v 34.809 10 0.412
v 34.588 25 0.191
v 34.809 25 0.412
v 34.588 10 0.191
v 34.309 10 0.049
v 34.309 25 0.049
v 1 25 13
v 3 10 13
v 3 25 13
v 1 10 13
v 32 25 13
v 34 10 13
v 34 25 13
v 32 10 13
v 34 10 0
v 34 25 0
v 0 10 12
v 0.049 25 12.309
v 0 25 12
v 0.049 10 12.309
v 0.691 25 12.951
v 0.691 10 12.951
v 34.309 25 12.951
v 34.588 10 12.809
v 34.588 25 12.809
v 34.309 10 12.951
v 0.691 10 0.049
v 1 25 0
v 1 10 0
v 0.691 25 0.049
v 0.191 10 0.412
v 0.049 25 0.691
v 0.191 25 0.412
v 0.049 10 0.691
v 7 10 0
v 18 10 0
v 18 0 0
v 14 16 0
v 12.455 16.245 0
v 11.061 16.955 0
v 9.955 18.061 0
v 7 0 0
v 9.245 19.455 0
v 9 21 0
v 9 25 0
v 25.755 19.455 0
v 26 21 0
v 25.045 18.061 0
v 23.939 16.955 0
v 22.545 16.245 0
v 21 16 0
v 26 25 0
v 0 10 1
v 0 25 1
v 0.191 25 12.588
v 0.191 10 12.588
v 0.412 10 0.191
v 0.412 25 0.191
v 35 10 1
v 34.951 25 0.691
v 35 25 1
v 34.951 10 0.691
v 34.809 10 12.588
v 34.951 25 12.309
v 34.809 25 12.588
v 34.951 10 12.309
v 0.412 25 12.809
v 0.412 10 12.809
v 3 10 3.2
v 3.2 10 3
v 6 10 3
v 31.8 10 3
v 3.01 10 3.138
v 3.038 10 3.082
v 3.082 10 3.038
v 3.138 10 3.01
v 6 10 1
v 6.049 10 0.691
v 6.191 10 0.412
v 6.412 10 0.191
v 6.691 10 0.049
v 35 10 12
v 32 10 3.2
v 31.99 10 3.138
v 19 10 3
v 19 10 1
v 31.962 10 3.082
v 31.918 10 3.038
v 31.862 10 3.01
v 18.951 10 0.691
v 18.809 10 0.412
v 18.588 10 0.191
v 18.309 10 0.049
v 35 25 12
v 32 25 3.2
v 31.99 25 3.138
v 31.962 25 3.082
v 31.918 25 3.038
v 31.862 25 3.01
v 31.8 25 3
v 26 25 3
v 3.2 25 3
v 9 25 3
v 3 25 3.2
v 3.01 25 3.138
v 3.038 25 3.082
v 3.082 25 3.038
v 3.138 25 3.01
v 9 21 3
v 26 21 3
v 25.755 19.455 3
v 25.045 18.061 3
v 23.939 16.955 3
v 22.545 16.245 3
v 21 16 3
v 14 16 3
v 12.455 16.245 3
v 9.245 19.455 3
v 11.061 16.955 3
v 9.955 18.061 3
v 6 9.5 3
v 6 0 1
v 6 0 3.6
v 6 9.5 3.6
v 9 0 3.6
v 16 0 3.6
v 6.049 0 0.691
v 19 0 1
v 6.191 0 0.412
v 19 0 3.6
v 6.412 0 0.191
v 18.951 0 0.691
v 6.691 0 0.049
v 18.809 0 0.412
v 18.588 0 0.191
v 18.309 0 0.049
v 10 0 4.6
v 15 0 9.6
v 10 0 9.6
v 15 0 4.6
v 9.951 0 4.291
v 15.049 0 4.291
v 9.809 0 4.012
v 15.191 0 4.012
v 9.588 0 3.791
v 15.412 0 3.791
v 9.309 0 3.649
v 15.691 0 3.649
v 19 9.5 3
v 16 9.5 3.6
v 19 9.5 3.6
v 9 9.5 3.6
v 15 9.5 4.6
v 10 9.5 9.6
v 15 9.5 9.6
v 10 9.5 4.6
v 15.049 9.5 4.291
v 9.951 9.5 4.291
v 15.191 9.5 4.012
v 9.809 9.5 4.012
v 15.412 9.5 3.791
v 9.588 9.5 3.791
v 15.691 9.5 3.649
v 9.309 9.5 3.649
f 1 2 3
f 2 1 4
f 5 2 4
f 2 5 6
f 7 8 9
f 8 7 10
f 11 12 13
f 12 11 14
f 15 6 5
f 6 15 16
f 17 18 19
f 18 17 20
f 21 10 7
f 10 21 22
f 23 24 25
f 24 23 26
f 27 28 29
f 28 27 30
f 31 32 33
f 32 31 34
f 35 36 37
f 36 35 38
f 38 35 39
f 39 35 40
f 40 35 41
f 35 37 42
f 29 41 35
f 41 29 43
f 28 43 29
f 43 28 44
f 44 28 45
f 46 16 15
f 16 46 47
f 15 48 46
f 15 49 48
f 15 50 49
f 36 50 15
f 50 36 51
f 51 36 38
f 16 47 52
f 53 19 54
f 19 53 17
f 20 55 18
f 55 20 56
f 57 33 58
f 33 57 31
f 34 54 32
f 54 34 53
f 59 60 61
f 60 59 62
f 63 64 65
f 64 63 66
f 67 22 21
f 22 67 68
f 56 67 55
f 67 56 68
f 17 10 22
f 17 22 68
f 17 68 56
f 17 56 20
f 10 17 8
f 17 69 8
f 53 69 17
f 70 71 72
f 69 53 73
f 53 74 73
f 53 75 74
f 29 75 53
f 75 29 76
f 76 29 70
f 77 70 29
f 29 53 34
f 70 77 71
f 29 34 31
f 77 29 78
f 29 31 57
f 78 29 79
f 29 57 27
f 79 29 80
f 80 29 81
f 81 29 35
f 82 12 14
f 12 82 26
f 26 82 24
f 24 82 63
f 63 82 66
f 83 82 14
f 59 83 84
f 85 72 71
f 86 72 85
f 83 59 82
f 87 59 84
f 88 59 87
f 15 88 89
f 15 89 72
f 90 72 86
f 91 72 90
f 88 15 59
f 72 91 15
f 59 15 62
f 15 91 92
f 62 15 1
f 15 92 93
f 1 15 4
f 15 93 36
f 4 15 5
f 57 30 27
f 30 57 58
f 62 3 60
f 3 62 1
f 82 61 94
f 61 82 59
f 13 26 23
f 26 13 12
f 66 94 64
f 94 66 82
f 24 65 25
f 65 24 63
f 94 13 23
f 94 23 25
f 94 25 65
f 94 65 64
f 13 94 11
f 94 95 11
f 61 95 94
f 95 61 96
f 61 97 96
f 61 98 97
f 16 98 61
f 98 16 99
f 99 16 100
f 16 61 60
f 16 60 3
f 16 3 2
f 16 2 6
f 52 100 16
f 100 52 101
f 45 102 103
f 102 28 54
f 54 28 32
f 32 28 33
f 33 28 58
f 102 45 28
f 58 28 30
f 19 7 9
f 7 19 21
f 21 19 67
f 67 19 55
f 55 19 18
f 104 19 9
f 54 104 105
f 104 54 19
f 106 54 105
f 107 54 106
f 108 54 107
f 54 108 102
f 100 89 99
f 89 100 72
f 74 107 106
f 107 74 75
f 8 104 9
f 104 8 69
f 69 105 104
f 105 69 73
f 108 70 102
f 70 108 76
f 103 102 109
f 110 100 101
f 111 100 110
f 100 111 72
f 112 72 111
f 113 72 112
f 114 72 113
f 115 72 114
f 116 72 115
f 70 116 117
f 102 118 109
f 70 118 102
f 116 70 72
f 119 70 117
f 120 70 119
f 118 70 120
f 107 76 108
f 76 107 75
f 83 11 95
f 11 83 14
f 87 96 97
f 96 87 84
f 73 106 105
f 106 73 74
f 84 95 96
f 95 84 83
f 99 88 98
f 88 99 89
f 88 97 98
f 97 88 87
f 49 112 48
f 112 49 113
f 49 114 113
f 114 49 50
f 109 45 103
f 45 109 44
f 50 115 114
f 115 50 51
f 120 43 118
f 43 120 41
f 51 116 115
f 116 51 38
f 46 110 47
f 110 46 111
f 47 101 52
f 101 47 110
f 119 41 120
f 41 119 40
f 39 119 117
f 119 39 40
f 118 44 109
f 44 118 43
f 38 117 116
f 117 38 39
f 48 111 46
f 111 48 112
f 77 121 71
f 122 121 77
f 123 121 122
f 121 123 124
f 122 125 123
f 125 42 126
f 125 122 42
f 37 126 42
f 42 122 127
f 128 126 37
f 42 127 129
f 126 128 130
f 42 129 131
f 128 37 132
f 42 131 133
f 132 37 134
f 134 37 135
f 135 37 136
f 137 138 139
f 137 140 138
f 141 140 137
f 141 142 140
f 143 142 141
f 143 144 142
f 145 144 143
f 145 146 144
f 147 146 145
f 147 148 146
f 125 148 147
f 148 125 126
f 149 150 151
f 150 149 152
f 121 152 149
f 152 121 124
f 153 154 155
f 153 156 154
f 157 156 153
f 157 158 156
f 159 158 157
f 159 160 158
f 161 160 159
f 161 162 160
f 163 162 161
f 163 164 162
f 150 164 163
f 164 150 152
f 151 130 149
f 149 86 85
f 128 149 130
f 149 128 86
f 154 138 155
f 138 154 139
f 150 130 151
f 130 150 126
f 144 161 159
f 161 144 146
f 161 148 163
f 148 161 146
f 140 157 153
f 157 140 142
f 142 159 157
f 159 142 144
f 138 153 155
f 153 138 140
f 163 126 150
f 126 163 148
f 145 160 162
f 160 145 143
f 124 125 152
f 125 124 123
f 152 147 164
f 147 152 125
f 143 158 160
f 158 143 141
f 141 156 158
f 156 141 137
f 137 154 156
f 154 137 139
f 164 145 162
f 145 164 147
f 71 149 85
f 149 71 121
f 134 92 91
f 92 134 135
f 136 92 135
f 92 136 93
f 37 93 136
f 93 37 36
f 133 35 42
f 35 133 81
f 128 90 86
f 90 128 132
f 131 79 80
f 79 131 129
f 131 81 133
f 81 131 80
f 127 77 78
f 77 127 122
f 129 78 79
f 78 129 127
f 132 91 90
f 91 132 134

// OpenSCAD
// file: ../common/extrusions.scad
//
// Common extrusions
// Author: Joseph M. Joy FTC 12598 mentor
//
EPSILON = 0.001; // For moving things to properly punch out holes

// Makes a flat (horizontal) "T":
//
// --------------
// |wtXht     --|
// ----\     /---
//      |wbX|
//      |hb |
//      -----
//<xoff>
//
// It could also be an inverted L shape
// if the lower (vertical) bar is wide enough to extend beyond the right 
// hand side of the upper (horizontal) bar.
//
// {xoff} is horizontal distance to the start of the bar.
// {r} is the radius of the
// curve shown as diagonals above.
// t is the thickness of the plate - in
// the z direction.
// Origin is the left hand corner
// of the bounding rectangle.
// 
module T_channel(wb, hb, wt, ht, xoff, r, t) {
    ow = 2*wt; // wide enough to 
    oh = 2*(hb+ht); // high enough to descend below the shape

    difference() {
        cube([wt, hb+ht, t]);
        translate([xoff-ow,hb-oh,-EPSILON]) oblong(ow, oh, r, t+2*EPSILON);
        translate([xoff+wb,hb-oh,-EPSILON]) oblong(ow, oh, r, t+2*EPSILON);
    }
}


// Makes a flat (horizontal) "O":
//
// /-------------\
// |             |
// | /--------\  |
// | |         | |
// | |         | |
// | |         | |
// | \         / |
// |  ---------  |
// \------------/
//
//
// It could also be a U or L
// if the oblong hole extends outside the outer
// boundary.
//
// ({xoff},{yoff} is origin of bounding-rectangle of the oblong hole
// {(wo}, {ho}) is the bounding box of the outer oblong.
// {(wi}, {hi}) is the bounding box of the inner (hole) oblong.
// {r} is the radius of the
// curve shown as diagonals above.
// t is the thickness of the plate - in
// the z direction.
// Origin is the left hand corner
// of the bounding rectangle.
// 
module O_channel(wo, ho, wi, hi, xoff, yoff, ro, ri, t) {
    difference() {
        oblong(wo, ho, ro, t);
        translate([xoff, yoff, -EPSILON]) oblong(wi, hi, ri, t+2*EPSILON);
    }
}


// A rectangular prism that fits within {w} x {h} and
// has rounded corners with radius {r} on all 4 sides.
// The actual radius may be reduced so keep the oblong
// viable. {t} is the thickness (in z).
module oblong(w, h, r, t) {
    r = min(r, w/2-EPSILON, h/2-EPSILON);
    translate([r, r, 0])
    linear_extrude(height = t, center = false, convexity = 10) {
        offset(r = r) square([w-2*r, h-2*r]);
    }
}


//
// Example code
//
wb = 10;
hb = 20;
wt = 40;
ht = 30;
t = 5;
r = 5;
ri = 1;
xoff = 10;
oblong(wb, hb, r, t);
translate([wb+5, 0, 0]) T_channel(wb, hb, wt, ht, xoff, r, t);
translate([wb+wt+10, 0, 0]) O_channel(wt, hb+ht, wb, 10*hb, xoff, xoff, r, ri, t);
// main file
//
//  Strain relief for FTC robot main power switch
//

use <../common/extrusions.scad>

$fn = 20;

thick = 3; // thickness of walls and base
LARGE = 100; // Something larger than any demension - for O to become U
EPSILON = 0.1; // Small emount to extend so that unions and intersections are clean

// Switch side and walls
module switch_part() {
    switch_w = 29; // width - x
    wall_h = 10; // height - z - of walls - will be slightly less than switch walls
                 // so that tape or ziptie is firm against top of the switch
    switch_d = 15; // depth - y
    ro = 1; // outside-facing radii
    ri = 0.2; // radii of switch channel inside walls
    side_w = 6; // side part of base without hole
    front_d = 6; // front part of base without hole
    hole_r = 5;
    hole_w = switch_w - 2 * side_w; // width of hole
    base_w = switch_w + 2*thick;
    difference() {
        translate([0, switch_d, 0]) rotate([90, 0, 0])
            O_channel(base_w, wall_h+thick, switch_w, LARGE,
                thick, thick, 
                ro, ri,switch_d);
        translate([thick + side_w, front_d, -EPSILON])
            oblong(hole_w, LARGE, hole_r, thick + 2*EPSILON);
    }
}

// Support below lugs - depth - in y-direction -  is {lug_d}
module lugs_support(lug_d) {
    lug_w = 13; // width - x 
    lug_h = 6; // height - z
    lug_center_w = 5; // width of center protrusion
    lug_r = 1; // radii of curve in center protrusion
    lug_pad_h = 0.6; // the base of the lug is slightly elevated (z) from the switch base
    lug_gap_d = 0.5; // a small gap in x between the start of the center protrusion.
                     // This is because the lugs are slightly taller (z) where they
                     // attach to the switch
    
    // The difference is to round the base of the lug - so that tape does not have to
    // wrap around a sharp corner.
    difference() {
        union() {
            cube([lug_w, lug_d+EPSILON, thick]);
            translate([lug_w, lug_d-lug_gap_d, lug_h+thick+lug_pad_h])
                rotate([90, 180, 0])
                    T_channel(lug_center_w, lug_h, lug_w, thick+lug_pad_h, 
                        (lug_w-lug_center_w)/2, 
                        lug_r, lug_d-lug_gap_d);
        }
        translate([-thick, lug_d+EPSILON, -thick]) rotate([90, 0, 0])
            O_channel(lug_w+2*thick, thick+thick, lug_w, LARGE, 
                thick, thick,
                0, lug_r, lug_d+2*EPSILON);
    }
}


module switch_strain_relief() {
    lug_d = 10; // depth - y - of lug
    lug_off = 6; // offset in x of lug position
    translate([0, lug_d, 0]) switch_part();
    translate([lug_off, 0, 0]) lugs_support(lug_d);
}


switch_strain_relief();
